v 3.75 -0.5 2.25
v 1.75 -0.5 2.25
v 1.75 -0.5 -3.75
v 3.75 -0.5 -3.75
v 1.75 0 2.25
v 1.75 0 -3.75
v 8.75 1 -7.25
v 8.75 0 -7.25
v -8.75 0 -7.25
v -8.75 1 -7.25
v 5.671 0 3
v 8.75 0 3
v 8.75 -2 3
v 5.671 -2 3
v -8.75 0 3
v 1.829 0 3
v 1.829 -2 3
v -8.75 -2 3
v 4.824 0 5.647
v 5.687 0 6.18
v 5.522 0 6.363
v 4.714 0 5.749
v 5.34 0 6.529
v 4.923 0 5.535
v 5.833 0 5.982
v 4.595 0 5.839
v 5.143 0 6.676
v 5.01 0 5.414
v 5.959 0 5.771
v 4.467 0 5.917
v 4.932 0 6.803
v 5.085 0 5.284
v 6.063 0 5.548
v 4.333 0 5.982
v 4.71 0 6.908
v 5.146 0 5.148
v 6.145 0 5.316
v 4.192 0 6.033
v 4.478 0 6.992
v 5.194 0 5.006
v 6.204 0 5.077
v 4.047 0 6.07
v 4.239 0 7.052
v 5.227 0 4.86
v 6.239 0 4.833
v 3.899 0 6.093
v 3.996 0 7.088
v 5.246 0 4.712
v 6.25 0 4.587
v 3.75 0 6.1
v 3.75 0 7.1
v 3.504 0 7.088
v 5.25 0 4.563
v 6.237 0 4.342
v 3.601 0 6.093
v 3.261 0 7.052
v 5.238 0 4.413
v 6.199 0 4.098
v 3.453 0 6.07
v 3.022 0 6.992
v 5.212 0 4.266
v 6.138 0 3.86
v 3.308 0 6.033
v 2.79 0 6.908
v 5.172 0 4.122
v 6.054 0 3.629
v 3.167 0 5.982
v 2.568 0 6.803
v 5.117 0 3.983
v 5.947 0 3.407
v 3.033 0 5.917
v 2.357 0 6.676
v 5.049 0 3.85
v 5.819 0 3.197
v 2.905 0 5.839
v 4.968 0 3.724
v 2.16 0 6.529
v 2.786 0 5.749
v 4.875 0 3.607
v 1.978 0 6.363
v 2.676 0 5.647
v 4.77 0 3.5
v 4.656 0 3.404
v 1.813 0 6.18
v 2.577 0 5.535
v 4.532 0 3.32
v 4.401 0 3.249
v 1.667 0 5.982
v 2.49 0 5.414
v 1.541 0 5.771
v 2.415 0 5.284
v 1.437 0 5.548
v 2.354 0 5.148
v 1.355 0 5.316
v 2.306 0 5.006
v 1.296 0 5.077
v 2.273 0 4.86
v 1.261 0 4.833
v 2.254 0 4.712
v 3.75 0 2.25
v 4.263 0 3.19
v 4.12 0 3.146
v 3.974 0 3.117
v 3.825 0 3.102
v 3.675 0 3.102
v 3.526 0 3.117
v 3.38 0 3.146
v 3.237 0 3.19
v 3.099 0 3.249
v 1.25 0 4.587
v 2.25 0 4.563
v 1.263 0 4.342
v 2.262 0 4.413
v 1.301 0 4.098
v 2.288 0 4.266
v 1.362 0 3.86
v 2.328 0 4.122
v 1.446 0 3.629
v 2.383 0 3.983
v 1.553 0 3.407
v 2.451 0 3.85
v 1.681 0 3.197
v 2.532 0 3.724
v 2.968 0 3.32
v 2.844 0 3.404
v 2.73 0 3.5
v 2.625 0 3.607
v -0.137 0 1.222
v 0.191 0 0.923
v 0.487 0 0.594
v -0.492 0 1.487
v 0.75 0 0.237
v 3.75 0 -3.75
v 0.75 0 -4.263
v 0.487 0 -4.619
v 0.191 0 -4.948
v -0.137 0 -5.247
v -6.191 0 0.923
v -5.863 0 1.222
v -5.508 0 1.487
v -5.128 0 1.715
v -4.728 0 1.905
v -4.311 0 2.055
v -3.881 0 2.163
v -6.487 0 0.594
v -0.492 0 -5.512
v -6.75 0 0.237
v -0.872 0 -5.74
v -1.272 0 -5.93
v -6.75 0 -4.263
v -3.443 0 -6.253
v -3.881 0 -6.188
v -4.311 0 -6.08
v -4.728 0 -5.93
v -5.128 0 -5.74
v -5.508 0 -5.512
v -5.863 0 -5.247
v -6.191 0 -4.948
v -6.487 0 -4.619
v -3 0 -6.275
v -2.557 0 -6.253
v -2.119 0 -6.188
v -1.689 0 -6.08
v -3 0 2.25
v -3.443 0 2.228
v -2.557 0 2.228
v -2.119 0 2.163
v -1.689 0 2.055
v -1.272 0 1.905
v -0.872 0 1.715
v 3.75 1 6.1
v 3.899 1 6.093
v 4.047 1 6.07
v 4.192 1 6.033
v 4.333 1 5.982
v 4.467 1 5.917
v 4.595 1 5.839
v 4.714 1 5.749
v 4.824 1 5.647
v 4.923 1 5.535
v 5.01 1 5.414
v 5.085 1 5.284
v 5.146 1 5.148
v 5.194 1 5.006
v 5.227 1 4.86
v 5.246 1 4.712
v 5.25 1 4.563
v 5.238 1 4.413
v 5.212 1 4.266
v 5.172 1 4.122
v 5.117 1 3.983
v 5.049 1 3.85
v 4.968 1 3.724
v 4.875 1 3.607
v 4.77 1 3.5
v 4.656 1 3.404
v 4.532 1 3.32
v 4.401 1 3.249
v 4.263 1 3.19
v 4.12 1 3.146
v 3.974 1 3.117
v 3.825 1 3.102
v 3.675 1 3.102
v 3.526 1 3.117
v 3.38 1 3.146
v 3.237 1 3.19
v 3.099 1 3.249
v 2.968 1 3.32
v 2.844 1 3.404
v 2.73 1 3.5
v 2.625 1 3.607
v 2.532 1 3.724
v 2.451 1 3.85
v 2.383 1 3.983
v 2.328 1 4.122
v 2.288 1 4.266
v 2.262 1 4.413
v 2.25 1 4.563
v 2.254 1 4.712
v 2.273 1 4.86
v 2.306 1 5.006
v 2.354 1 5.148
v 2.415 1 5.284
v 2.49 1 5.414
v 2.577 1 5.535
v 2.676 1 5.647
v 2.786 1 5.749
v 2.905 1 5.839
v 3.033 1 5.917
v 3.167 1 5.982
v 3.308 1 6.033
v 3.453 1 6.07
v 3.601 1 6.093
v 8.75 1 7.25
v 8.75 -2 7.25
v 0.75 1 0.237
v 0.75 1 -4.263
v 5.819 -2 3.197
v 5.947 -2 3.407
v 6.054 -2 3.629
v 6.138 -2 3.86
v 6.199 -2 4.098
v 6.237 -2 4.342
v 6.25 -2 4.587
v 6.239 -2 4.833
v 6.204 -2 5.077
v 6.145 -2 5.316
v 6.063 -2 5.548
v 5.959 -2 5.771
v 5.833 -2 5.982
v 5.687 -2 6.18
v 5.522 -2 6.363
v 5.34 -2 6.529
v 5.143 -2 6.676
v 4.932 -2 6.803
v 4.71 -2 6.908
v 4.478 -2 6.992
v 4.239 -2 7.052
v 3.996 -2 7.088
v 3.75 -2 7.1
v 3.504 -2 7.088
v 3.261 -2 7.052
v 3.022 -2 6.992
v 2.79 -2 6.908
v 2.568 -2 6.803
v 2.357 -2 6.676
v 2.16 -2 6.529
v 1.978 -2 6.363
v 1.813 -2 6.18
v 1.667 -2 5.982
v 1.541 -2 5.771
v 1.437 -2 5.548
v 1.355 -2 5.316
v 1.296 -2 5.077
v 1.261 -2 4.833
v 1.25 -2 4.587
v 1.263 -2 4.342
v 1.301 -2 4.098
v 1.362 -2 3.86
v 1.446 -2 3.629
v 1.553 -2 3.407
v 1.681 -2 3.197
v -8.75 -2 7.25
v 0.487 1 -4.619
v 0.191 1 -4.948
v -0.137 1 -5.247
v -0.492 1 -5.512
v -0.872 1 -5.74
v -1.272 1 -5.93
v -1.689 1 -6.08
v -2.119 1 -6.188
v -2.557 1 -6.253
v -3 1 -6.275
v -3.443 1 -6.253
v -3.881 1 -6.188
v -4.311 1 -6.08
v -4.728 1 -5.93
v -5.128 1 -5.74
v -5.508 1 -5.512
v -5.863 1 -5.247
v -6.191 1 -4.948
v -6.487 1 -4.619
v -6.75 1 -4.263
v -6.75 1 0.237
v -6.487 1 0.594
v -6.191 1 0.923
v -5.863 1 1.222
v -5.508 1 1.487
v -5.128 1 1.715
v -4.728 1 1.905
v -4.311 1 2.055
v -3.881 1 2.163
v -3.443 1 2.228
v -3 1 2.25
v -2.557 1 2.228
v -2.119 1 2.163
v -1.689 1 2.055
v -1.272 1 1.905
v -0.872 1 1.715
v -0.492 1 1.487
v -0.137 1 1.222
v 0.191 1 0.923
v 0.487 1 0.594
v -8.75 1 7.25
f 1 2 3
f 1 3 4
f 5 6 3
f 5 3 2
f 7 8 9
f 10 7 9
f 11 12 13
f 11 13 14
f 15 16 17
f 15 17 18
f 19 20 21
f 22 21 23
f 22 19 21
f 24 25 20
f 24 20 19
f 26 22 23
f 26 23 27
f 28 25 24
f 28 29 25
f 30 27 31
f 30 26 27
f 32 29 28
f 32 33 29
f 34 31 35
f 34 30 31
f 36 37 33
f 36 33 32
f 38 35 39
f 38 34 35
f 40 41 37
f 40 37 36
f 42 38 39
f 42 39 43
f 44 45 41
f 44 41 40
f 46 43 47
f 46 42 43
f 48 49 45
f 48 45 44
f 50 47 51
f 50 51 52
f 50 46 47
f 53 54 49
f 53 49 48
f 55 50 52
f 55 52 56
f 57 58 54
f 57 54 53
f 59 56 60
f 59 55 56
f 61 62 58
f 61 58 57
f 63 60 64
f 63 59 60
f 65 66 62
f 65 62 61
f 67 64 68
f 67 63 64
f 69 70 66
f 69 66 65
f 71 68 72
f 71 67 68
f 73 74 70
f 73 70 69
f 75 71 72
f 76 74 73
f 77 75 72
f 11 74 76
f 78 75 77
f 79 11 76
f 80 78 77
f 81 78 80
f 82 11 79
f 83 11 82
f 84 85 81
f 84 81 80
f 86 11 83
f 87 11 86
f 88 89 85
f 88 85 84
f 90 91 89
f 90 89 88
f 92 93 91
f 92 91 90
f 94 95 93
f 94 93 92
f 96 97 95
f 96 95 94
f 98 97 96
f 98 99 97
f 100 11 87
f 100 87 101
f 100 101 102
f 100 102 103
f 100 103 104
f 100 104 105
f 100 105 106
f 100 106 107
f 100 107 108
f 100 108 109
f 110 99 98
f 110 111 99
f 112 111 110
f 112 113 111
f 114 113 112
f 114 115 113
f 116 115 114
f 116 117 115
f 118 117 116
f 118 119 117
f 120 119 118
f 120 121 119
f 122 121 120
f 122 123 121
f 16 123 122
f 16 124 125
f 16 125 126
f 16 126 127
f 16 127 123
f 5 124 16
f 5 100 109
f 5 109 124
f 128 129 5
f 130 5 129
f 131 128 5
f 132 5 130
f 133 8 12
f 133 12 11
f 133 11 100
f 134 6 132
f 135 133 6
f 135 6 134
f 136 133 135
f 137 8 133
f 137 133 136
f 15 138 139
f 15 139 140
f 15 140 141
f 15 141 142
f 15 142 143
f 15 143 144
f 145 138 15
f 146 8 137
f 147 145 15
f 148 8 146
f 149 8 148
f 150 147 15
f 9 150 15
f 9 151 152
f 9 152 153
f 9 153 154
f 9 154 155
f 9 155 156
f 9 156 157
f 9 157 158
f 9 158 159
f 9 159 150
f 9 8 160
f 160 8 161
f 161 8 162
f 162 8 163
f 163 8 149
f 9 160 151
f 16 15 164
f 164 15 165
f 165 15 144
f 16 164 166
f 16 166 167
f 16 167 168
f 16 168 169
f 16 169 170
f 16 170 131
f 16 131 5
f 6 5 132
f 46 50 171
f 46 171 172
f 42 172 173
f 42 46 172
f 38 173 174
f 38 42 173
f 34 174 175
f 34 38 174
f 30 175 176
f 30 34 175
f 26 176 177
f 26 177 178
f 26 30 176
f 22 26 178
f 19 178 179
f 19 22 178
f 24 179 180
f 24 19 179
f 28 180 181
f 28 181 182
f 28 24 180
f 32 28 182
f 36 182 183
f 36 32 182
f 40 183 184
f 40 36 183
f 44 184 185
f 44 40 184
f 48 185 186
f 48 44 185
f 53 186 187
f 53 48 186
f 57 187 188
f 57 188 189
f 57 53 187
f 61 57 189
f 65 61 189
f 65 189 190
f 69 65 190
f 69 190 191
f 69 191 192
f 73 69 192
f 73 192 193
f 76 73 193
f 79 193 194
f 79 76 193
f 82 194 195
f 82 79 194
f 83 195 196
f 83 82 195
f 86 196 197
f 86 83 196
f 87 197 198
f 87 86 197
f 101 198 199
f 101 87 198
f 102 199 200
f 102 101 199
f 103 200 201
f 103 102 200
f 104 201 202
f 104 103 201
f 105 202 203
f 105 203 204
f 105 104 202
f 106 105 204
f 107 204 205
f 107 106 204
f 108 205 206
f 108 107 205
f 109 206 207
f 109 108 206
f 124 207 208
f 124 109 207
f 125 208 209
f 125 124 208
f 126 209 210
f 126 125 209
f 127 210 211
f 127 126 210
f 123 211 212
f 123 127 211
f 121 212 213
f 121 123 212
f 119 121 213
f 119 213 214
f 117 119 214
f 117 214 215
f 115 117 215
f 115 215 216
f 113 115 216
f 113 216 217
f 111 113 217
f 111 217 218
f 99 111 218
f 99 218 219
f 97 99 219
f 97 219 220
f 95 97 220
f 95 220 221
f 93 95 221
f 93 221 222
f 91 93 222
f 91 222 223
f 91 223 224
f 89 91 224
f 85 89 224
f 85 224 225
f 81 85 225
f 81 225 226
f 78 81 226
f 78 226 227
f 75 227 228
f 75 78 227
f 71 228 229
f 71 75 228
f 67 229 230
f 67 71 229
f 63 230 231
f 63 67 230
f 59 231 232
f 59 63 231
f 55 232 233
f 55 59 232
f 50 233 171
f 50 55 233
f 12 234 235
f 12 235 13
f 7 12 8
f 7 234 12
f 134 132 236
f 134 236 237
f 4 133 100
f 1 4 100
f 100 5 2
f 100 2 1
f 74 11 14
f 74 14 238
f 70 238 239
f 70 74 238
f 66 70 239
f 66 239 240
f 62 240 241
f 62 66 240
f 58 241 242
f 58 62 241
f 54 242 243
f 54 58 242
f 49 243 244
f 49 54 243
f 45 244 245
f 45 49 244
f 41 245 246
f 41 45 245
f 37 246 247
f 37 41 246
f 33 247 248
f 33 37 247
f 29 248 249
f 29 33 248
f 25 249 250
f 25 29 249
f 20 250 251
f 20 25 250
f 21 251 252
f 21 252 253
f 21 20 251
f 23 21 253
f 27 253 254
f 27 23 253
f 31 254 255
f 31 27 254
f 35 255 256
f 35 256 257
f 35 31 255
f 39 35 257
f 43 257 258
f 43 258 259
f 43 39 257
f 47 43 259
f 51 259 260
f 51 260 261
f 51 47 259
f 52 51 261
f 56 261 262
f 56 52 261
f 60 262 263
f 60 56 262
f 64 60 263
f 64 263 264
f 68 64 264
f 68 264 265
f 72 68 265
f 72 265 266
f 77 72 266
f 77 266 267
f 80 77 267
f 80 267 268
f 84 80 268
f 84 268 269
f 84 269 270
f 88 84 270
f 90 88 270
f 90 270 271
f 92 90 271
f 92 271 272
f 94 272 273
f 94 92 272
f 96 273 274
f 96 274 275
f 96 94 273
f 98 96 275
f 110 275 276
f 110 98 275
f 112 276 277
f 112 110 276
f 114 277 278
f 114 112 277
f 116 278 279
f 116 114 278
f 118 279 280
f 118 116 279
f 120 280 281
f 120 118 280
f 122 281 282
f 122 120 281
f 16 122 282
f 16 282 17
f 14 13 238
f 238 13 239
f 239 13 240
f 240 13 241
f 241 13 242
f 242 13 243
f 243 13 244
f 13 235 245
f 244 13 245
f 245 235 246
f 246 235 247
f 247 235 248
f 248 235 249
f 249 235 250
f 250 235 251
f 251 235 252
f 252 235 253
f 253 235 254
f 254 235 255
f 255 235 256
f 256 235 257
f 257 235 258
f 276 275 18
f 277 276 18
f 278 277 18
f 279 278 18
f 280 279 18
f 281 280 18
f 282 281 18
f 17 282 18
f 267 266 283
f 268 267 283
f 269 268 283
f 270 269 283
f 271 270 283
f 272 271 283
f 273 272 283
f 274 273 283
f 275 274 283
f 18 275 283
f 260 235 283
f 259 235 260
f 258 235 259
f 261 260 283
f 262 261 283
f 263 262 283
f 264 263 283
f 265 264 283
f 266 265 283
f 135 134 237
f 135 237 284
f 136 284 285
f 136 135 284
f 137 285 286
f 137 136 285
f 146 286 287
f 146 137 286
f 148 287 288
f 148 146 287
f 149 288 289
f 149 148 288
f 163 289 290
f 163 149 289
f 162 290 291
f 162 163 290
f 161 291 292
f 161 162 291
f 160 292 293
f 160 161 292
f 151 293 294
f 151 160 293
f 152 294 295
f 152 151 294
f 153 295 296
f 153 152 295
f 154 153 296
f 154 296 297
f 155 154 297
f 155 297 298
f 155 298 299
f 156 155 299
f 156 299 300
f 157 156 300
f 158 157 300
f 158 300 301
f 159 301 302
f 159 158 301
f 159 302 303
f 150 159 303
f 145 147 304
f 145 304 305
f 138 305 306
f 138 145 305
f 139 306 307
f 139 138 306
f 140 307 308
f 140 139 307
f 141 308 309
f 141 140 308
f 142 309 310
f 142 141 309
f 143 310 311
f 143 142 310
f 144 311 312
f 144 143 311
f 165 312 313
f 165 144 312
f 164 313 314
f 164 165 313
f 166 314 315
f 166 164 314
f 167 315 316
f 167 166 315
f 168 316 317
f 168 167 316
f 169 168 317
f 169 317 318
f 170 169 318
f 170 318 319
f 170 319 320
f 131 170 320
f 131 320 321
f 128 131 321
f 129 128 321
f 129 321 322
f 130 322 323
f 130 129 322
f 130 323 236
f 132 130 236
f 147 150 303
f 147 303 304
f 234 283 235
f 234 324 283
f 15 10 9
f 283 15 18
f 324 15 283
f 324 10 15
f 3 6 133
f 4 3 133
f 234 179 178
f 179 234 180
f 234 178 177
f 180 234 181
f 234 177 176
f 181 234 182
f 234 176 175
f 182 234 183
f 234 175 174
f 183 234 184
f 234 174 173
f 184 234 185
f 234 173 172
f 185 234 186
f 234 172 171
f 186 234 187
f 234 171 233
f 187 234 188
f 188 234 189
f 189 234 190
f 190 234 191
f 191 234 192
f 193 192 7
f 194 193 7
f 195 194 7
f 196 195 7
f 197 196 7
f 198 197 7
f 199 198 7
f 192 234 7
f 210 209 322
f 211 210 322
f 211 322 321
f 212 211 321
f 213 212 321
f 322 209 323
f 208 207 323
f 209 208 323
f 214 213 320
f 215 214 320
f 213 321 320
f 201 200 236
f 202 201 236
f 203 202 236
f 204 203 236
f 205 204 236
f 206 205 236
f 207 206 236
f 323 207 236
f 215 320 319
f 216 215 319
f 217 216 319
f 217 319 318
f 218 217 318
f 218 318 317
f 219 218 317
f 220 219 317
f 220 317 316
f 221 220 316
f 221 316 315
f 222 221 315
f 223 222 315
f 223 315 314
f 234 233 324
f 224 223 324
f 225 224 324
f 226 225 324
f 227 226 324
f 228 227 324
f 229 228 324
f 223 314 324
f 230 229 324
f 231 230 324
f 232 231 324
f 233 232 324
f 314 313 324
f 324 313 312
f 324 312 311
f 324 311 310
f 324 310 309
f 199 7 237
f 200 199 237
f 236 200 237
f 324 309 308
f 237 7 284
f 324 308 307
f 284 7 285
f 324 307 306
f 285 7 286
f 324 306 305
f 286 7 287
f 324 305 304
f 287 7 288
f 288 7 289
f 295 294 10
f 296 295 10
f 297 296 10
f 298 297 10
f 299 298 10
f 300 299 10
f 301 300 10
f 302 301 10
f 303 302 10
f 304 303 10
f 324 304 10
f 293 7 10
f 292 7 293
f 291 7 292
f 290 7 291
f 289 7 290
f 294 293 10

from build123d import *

# Parameters (mm, degrees)
CROQUIS1_R              = 1.5
SALIENTE_EXTRUIR1_DEPTH = 1
SALIENTE_EXTRUIR2_DEPTH = 2
CROQUIS3_W              = 2
CROQUIS3_H              = 6
SALIENTE_EXTRUIR3_DEPTH = 0.5


with BuildPart() as part:
    # Croquis1 → Saliente-Extruir1 (new body)
    with BuildSketch(Plane(origin=(0, 0, 0), x_dir=(1, 0, 0), z_dir=(0, 1, 0))):
        Polygon((-8.75, 7.25), (-6.75, 7.25), (0.75, 7.25), (8.75, 7.25), (8.75, -7.25), (-8.75, -7.25), align=None)
        with Locations(Location((3.75, -4.6, 0), (0, 0, 270))):
            Circle(CROQUIS1_R, mode=Mode.SUBTRACT)
        with BuildLine():
            Line((-6.75, 4.262531407), (-6.75, -0.237468593))
            ThreePointArc((-6.75, -0.237468593), (-3, -2.25), (0.75, -0.237468593))
            Line((0.75, -0.237468593), (0.75, 4.262531407))
            ThreePointArc((0.75, 4.262531407), (-3, 6.275062814), (-6.75, 4.262531407))
        make_face(mode=Mode.SUBTRACT)
    extrude(amount=SALIENTE_EXTRUIR1_DEPTH)

    # Croquis2 → Saliente-Extruir2 (add)
    with BuildSketch(Plane.XZ):
        with BuildLine():
            Line((-8.75, 7.25), (8.75, 7.25))
            Line((8.75, 7.25), (8.75, 3))
            Line((8.75, 3), (5.670937271, 3))
            ThreePointArc((5.670937271, 3), (3.75, 7.1), (1.829062729, 3))
            Line((1.829062729, 3), (-8.75, 3))
            Line((-8.75, 3), (-8.75, 7.25))
        make_face()
    extrude(amount=SALIENTE_EXTRUIR2_DEPTH)

    # Croquis3 → Saliente-Extruir3 (add)
    with BuildSketch(Plane.XZ):
        with Locations((2.75, -0.75)):
            Rectangle(CROQUIS3_W, CROQUIS3_H)
    extrude(amount=SALIENTE_EXTRUIR3_DEPTH)


solid = part.part
